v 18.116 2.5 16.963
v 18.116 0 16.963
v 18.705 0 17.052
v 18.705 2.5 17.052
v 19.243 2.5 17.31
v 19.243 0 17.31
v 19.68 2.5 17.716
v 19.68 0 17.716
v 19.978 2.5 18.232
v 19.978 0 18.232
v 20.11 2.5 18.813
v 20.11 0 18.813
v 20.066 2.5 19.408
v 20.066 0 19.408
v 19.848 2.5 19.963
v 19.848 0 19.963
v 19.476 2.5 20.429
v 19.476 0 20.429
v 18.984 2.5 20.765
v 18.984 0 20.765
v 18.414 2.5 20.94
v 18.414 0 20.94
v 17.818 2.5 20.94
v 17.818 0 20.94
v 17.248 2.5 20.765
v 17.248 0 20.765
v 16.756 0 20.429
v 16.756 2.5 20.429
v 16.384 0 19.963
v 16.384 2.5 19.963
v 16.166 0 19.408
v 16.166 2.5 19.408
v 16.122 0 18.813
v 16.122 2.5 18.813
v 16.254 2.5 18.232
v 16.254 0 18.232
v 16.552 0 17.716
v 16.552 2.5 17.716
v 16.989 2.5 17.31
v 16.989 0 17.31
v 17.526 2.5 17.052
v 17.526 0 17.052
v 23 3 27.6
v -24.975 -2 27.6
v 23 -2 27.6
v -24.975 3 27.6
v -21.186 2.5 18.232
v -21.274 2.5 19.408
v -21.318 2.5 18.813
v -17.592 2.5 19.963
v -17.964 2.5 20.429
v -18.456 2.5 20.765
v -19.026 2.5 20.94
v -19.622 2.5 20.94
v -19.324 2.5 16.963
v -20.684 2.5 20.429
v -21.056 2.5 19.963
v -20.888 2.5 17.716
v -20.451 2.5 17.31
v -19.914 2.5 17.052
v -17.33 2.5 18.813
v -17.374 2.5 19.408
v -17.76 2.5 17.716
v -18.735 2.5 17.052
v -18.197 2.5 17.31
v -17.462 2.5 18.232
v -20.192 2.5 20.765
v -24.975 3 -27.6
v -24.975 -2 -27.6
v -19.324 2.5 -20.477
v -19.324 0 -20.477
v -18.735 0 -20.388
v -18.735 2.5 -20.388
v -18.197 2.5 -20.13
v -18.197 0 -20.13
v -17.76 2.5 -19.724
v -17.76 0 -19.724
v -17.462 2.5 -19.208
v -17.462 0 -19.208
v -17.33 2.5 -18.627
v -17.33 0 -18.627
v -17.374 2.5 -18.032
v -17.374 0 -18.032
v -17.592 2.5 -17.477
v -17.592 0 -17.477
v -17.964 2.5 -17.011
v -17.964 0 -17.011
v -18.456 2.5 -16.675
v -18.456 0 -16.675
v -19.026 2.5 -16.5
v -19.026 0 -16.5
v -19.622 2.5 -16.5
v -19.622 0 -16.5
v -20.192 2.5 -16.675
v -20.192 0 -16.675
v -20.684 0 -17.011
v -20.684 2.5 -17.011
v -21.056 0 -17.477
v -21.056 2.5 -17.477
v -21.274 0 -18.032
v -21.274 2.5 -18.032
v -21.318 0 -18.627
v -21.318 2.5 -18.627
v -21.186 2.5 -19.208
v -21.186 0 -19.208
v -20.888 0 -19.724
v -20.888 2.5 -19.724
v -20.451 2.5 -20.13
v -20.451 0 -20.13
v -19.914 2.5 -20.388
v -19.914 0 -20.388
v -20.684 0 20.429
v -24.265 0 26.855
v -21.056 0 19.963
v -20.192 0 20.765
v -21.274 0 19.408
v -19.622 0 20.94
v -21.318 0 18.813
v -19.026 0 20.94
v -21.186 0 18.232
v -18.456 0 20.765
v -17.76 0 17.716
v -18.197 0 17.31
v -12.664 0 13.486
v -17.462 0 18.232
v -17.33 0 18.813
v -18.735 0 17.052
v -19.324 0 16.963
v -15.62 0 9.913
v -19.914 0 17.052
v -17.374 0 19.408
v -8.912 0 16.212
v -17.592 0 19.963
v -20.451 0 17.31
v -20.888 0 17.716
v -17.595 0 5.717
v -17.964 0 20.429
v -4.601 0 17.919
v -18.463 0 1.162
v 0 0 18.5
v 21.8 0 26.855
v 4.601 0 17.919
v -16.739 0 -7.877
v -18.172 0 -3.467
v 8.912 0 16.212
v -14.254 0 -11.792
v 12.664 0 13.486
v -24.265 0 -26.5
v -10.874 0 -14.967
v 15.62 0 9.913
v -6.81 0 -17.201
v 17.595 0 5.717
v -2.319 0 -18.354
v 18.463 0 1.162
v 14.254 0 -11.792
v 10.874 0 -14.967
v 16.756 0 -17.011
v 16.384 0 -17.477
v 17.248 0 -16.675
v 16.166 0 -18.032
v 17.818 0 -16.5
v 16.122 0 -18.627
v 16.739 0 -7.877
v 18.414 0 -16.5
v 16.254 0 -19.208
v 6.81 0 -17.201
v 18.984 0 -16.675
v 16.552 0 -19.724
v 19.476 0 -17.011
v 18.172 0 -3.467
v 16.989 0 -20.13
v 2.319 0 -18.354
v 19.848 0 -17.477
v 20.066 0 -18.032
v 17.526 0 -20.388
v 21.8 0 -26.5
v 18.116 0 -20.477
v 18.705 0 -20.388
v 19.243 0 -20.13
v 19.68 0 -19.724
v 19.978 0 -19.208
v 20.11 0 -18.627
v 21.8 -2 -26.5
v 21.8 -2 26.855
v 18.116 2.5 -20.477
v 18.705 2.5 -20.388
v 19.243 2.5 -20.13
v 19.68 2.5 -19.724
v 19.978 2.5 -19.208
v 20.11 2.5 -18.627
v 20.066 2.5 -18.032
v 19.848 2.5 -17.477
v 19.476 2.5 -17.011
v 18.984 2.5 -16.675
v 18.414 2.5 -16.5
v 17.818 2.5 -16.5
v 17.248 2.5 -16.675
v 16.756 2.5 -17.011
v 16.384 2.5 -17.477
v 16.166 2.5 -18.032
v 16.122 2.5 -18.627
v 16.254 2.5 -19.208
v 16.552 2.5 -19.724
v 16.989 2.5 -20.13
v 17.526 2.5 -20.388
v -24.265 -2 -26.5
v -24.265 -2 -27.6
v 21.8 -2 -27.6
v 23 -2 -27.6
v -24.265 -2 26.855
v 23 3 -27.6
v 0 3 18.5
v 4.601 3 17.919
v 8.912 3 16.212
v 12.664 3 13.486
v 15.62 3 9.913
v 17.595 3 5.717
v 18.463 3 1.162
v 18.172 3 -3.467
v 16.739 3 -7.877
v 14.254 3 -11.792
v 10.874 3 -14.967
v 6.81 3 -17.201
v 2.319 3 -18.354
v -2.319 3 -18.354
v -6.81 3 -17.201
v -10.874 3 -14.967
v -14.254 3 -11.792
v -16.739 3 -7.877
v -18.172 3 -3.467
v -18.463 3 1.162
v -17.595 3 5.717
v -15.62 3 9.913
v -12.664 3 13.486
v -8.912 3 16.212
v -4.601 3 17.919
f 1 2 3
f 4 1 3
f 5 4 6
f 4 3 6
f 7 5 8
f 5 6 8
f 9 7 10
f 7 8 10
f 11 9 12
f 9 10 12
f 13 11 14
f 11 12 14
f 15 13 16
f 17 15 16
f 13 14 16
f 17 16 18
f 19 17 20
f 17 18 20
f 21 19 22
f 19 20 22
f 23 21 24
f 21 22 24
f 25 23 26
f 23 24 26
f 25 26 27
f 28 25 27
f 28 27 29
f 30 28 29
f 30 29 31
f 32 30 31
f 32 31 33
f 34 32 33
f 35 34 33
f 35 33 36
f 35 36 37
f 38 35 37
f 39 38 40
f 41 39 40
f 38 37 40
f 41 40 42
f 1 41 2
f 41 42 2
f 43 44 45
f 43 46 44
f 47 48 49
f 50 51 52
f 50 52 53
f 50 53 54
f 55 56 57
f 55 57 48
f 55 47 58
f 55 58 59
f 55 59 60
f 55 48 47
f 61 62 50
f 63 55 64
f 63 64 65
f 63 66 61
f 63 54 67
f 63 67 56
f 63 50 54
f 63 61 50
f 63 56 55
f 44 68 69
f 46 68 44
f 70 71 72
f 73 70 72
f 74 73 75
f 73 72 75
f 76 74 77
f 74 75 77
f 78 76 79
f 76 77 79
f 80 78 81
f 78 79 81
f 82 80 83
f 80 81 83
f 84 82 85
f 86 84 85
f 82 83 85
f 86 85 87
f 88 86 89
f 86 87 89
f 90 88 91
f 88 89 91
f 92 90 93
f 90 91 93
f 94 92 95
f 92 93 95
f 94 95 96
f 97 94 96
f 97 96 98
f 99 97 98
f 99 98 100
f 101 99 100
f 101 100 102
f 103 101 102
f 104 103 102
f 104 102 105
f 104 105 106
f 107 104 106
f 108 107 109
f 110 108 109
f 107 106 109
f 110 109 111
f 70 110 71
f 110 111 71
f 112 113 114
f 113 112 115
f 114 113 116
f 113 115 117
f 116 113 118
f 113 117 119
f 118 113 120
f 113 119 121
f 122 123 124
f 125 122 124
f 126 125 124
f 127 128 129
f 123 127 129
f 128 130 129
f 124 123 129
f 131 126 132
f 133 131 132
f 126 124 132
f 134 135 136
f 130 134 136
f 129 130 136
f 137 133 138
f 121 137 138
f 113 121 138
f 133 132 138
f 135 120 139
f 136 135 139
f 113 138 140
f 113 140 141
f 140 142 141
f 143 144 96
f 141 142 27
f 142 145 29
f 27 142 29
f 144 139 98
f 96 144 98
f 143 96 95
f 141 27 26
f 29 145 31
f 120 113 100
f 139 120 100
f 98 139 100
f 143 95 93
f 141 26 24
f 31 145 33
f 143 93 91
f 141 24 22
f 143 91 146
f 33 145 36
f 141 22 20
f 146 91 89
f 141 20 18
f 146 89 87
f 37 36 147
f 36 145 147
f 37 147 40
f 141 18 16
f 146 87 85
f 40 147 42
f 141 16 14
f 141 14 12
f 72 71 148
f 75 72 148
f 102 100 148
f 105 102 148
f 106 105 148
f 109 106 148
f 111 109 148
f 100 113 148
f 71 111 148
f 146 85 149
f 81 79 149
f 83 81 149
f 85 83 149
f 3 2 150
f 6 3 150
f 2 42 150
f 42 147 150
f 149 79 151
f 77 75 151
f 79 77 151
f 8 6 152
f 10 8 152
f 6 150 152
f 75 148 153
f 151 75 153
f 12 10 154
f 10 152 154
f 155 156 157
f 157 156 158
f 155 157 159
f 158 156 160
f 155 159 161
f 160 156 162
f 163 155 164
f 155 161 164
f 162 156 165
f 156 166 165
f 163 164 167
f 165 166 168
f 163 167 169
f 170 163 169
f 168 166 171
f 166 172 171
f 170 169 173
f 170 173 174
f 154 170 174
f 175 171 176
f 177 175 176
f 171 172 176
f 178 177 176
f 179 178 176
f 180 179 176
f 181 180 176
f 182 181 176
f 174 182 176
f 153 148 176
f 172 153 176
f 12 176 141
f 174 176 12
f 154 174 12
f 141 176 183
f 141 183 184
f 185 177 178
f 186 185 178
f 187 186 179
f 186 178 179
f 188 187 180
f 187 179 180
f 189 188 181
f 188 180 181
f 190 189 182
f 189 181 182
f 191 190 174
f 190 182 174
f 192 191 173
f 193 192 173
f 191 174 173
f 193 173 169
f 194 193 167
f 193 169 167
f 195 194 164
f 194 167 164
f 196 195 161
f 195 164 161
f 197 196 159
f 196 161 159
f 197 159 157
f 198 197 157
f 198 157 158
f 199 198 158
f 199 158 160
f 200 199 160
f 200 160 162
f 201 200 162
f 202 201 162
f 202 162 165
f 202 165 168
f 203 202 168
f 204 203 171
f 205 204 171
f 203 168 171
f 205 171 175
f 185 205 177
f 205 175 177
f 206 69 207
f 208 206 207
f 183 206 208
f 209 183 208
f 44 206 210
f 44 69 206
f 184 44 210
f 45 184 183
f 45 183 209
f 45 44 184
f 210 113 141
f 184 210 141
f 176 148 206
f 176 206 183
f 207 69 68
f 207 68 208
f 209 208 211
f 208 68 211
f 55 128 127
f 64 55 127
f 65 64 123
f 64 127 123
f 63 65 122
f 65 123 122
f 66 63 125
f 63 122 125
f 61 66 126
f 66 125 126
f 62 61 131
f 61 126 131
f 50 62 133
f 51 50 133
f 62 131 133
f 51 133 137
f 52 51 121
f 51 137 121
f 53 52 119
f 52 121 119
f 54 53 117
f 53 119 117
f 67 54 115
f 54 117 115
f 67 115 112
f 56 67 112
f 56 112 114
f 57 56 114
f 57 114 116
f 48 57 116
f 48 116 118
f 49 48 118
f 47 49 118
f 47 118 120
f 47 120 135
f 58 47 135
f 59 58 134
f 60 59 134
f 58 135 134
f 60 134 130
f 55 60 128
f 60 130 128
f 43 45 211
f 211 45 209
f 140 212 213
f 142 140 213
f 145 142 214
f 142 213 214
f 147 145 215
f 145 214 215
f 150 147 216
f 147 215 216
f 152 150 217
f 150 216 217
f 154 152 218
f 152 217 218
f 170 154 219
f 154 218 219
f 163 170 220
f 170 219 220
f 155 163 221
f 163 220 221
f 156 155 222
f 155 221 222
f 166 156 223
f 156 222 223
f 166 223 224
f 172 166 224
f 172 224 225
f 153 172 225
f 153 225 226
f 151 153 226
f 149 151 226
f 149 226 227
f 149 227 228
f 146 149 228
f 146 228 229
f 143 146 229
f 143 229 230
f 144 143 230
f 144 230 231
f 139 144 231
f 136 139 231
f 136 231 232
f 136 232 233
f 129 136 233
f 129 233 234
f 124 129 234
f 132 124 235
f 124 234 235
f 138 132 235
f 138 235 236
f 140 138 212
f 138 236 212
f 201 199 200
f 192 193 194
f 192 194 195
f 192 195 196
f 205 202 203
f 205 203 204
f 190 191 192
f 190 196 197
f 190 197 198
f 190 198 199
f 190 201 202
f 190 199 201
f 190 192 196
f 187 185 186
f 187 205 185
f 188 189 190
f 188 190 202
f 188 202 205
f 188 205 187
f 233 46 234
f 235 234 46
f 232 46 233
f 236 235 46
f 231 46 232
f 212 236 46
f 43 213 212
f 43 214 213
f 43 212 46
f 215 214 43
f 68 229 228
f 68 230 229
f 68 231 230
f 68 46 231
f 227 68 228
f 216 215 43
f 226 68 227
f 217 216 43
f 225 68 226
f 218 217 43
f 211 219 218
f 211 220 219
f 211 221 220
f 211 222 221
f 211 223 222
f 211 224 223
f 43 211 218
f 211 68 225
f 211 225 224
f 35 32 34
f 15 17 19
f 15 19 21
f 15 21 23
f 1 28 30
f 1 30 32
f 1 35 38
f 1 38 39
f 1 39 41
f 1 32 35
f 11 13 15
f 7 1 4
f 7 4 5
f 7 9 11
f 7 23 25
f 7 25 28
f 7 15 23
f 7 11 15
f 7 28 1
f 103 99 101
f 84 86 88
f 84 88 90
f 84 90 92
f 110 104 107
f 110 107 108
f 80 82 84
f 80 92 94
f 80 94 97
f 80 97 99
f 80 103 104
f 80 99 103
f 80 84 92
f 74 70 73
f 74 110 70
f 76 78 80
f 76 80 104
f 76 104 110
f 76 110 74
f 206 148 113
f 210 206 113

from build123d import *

# Parameters (mm, degrees)
SKETCH1_W           = 47.974978614
SKETCH1_H           = 55.2
BOSS_EXTRUDE1_DEPTH = 3
SKETCH3_R           = 18.5
CUT_EXTRUDE2_DEPTH  = 8
SKETCH7_W           = 0.709516438
SKETCH7_H           = 55.2
SKETCH7_W_2         = 1.2
BOSS_EXTRUDE2_DEPTH = 2
SKETCH8_W           = 46.065462176
SKETCH8_H           = 0.744802826
SKETCH8_H_2         = 1.099561045
BOSS_EXTRUDE3_DEPTH = 2
SKETCH9_R           = 2
CUT_EXTRUDE4_DEPTH  = 2.5


with BuildPart() as part:
    # Sketch1 → Boss-Extrude1 (new body)
    with BuildSketch(Plane(origin=(0, 0, 0), x_dir=(1, 0, 0), z_dir=(0, 1, 0))):
        with Locations((-0.987489307, 0)):
            Rectangle(SKETCH1_W, SKETCH1_H)
    extrude(amount=BOSS_EXTRUDE1_DEPTH)

    # Sketch3 → Cut-Extrude2 (cut)
    with BuildSketch(Plane(origin=(0, 3, 0), x_dir=(1, 0, 0), z_dir=(0, 1, 0))):
        with Locations(Location((0, 0, 0), (0, 0, 270))):
            Circle(SKETCH3_R)
    extrude(amount=-CUT_EXTRUDE2_DEPTH, mode=Mode.SUBTRACT)

    # Sketch7 → Boss-Extrude2 (add)
    with BuildSketch(Plane.XZ):
        with Locations((-24.620220395, 0)):
            Rectangle(SKETCH7_W, SKETCH7_H)
        with Locations((22.4, 0)):
            Rectangle(SKETCH7_W_2, SKETCH7_H)
    extrude(amount=BOSS_EXTRUDE2_DEPTH)

    # Sketch8 → Boss-Extrude3 (add)
    with BuildSketch(Plane.XZ):
        with Locations((-1.232731088, 27.227598587)):
            Rectangle(SKETCH8_W, SKETCH8_H)
        with Locations((-1.232731088, -27.050219478)):
            Rectangle(SKETCH8_W, SKETCH8_H_2)
    extrude(amount=BOSS_EXTRUDE3_DEPTH)

    # Sketch9 → Cut-Extrude4 (cut)
    with BuildSketch(Plane.XZ):
        with Locations(Location((-19.324035892, 18.962761771, 0), (0, 0, 270))):
            Circle(SKETCH9_R)
        with Locations(Location((18.115964108, 18.962761771, 0), (0, 0, 270))):
            Circle(SKETCH9_R)
        with Locations(Location((-19.324035892, -18.477238229, 0), (0, 0, 270))):
            Circle(SKETCH9_R)
        with Locations(Location((18.115964108, -18.477238229, 0), (0, 0, 270))):
            Circle(SKETCH9_R)
    extrude(amount=-CUT_EXTRUDE4_DEPTH, mode=Mode.SUBTRACT)


solid = part.part
